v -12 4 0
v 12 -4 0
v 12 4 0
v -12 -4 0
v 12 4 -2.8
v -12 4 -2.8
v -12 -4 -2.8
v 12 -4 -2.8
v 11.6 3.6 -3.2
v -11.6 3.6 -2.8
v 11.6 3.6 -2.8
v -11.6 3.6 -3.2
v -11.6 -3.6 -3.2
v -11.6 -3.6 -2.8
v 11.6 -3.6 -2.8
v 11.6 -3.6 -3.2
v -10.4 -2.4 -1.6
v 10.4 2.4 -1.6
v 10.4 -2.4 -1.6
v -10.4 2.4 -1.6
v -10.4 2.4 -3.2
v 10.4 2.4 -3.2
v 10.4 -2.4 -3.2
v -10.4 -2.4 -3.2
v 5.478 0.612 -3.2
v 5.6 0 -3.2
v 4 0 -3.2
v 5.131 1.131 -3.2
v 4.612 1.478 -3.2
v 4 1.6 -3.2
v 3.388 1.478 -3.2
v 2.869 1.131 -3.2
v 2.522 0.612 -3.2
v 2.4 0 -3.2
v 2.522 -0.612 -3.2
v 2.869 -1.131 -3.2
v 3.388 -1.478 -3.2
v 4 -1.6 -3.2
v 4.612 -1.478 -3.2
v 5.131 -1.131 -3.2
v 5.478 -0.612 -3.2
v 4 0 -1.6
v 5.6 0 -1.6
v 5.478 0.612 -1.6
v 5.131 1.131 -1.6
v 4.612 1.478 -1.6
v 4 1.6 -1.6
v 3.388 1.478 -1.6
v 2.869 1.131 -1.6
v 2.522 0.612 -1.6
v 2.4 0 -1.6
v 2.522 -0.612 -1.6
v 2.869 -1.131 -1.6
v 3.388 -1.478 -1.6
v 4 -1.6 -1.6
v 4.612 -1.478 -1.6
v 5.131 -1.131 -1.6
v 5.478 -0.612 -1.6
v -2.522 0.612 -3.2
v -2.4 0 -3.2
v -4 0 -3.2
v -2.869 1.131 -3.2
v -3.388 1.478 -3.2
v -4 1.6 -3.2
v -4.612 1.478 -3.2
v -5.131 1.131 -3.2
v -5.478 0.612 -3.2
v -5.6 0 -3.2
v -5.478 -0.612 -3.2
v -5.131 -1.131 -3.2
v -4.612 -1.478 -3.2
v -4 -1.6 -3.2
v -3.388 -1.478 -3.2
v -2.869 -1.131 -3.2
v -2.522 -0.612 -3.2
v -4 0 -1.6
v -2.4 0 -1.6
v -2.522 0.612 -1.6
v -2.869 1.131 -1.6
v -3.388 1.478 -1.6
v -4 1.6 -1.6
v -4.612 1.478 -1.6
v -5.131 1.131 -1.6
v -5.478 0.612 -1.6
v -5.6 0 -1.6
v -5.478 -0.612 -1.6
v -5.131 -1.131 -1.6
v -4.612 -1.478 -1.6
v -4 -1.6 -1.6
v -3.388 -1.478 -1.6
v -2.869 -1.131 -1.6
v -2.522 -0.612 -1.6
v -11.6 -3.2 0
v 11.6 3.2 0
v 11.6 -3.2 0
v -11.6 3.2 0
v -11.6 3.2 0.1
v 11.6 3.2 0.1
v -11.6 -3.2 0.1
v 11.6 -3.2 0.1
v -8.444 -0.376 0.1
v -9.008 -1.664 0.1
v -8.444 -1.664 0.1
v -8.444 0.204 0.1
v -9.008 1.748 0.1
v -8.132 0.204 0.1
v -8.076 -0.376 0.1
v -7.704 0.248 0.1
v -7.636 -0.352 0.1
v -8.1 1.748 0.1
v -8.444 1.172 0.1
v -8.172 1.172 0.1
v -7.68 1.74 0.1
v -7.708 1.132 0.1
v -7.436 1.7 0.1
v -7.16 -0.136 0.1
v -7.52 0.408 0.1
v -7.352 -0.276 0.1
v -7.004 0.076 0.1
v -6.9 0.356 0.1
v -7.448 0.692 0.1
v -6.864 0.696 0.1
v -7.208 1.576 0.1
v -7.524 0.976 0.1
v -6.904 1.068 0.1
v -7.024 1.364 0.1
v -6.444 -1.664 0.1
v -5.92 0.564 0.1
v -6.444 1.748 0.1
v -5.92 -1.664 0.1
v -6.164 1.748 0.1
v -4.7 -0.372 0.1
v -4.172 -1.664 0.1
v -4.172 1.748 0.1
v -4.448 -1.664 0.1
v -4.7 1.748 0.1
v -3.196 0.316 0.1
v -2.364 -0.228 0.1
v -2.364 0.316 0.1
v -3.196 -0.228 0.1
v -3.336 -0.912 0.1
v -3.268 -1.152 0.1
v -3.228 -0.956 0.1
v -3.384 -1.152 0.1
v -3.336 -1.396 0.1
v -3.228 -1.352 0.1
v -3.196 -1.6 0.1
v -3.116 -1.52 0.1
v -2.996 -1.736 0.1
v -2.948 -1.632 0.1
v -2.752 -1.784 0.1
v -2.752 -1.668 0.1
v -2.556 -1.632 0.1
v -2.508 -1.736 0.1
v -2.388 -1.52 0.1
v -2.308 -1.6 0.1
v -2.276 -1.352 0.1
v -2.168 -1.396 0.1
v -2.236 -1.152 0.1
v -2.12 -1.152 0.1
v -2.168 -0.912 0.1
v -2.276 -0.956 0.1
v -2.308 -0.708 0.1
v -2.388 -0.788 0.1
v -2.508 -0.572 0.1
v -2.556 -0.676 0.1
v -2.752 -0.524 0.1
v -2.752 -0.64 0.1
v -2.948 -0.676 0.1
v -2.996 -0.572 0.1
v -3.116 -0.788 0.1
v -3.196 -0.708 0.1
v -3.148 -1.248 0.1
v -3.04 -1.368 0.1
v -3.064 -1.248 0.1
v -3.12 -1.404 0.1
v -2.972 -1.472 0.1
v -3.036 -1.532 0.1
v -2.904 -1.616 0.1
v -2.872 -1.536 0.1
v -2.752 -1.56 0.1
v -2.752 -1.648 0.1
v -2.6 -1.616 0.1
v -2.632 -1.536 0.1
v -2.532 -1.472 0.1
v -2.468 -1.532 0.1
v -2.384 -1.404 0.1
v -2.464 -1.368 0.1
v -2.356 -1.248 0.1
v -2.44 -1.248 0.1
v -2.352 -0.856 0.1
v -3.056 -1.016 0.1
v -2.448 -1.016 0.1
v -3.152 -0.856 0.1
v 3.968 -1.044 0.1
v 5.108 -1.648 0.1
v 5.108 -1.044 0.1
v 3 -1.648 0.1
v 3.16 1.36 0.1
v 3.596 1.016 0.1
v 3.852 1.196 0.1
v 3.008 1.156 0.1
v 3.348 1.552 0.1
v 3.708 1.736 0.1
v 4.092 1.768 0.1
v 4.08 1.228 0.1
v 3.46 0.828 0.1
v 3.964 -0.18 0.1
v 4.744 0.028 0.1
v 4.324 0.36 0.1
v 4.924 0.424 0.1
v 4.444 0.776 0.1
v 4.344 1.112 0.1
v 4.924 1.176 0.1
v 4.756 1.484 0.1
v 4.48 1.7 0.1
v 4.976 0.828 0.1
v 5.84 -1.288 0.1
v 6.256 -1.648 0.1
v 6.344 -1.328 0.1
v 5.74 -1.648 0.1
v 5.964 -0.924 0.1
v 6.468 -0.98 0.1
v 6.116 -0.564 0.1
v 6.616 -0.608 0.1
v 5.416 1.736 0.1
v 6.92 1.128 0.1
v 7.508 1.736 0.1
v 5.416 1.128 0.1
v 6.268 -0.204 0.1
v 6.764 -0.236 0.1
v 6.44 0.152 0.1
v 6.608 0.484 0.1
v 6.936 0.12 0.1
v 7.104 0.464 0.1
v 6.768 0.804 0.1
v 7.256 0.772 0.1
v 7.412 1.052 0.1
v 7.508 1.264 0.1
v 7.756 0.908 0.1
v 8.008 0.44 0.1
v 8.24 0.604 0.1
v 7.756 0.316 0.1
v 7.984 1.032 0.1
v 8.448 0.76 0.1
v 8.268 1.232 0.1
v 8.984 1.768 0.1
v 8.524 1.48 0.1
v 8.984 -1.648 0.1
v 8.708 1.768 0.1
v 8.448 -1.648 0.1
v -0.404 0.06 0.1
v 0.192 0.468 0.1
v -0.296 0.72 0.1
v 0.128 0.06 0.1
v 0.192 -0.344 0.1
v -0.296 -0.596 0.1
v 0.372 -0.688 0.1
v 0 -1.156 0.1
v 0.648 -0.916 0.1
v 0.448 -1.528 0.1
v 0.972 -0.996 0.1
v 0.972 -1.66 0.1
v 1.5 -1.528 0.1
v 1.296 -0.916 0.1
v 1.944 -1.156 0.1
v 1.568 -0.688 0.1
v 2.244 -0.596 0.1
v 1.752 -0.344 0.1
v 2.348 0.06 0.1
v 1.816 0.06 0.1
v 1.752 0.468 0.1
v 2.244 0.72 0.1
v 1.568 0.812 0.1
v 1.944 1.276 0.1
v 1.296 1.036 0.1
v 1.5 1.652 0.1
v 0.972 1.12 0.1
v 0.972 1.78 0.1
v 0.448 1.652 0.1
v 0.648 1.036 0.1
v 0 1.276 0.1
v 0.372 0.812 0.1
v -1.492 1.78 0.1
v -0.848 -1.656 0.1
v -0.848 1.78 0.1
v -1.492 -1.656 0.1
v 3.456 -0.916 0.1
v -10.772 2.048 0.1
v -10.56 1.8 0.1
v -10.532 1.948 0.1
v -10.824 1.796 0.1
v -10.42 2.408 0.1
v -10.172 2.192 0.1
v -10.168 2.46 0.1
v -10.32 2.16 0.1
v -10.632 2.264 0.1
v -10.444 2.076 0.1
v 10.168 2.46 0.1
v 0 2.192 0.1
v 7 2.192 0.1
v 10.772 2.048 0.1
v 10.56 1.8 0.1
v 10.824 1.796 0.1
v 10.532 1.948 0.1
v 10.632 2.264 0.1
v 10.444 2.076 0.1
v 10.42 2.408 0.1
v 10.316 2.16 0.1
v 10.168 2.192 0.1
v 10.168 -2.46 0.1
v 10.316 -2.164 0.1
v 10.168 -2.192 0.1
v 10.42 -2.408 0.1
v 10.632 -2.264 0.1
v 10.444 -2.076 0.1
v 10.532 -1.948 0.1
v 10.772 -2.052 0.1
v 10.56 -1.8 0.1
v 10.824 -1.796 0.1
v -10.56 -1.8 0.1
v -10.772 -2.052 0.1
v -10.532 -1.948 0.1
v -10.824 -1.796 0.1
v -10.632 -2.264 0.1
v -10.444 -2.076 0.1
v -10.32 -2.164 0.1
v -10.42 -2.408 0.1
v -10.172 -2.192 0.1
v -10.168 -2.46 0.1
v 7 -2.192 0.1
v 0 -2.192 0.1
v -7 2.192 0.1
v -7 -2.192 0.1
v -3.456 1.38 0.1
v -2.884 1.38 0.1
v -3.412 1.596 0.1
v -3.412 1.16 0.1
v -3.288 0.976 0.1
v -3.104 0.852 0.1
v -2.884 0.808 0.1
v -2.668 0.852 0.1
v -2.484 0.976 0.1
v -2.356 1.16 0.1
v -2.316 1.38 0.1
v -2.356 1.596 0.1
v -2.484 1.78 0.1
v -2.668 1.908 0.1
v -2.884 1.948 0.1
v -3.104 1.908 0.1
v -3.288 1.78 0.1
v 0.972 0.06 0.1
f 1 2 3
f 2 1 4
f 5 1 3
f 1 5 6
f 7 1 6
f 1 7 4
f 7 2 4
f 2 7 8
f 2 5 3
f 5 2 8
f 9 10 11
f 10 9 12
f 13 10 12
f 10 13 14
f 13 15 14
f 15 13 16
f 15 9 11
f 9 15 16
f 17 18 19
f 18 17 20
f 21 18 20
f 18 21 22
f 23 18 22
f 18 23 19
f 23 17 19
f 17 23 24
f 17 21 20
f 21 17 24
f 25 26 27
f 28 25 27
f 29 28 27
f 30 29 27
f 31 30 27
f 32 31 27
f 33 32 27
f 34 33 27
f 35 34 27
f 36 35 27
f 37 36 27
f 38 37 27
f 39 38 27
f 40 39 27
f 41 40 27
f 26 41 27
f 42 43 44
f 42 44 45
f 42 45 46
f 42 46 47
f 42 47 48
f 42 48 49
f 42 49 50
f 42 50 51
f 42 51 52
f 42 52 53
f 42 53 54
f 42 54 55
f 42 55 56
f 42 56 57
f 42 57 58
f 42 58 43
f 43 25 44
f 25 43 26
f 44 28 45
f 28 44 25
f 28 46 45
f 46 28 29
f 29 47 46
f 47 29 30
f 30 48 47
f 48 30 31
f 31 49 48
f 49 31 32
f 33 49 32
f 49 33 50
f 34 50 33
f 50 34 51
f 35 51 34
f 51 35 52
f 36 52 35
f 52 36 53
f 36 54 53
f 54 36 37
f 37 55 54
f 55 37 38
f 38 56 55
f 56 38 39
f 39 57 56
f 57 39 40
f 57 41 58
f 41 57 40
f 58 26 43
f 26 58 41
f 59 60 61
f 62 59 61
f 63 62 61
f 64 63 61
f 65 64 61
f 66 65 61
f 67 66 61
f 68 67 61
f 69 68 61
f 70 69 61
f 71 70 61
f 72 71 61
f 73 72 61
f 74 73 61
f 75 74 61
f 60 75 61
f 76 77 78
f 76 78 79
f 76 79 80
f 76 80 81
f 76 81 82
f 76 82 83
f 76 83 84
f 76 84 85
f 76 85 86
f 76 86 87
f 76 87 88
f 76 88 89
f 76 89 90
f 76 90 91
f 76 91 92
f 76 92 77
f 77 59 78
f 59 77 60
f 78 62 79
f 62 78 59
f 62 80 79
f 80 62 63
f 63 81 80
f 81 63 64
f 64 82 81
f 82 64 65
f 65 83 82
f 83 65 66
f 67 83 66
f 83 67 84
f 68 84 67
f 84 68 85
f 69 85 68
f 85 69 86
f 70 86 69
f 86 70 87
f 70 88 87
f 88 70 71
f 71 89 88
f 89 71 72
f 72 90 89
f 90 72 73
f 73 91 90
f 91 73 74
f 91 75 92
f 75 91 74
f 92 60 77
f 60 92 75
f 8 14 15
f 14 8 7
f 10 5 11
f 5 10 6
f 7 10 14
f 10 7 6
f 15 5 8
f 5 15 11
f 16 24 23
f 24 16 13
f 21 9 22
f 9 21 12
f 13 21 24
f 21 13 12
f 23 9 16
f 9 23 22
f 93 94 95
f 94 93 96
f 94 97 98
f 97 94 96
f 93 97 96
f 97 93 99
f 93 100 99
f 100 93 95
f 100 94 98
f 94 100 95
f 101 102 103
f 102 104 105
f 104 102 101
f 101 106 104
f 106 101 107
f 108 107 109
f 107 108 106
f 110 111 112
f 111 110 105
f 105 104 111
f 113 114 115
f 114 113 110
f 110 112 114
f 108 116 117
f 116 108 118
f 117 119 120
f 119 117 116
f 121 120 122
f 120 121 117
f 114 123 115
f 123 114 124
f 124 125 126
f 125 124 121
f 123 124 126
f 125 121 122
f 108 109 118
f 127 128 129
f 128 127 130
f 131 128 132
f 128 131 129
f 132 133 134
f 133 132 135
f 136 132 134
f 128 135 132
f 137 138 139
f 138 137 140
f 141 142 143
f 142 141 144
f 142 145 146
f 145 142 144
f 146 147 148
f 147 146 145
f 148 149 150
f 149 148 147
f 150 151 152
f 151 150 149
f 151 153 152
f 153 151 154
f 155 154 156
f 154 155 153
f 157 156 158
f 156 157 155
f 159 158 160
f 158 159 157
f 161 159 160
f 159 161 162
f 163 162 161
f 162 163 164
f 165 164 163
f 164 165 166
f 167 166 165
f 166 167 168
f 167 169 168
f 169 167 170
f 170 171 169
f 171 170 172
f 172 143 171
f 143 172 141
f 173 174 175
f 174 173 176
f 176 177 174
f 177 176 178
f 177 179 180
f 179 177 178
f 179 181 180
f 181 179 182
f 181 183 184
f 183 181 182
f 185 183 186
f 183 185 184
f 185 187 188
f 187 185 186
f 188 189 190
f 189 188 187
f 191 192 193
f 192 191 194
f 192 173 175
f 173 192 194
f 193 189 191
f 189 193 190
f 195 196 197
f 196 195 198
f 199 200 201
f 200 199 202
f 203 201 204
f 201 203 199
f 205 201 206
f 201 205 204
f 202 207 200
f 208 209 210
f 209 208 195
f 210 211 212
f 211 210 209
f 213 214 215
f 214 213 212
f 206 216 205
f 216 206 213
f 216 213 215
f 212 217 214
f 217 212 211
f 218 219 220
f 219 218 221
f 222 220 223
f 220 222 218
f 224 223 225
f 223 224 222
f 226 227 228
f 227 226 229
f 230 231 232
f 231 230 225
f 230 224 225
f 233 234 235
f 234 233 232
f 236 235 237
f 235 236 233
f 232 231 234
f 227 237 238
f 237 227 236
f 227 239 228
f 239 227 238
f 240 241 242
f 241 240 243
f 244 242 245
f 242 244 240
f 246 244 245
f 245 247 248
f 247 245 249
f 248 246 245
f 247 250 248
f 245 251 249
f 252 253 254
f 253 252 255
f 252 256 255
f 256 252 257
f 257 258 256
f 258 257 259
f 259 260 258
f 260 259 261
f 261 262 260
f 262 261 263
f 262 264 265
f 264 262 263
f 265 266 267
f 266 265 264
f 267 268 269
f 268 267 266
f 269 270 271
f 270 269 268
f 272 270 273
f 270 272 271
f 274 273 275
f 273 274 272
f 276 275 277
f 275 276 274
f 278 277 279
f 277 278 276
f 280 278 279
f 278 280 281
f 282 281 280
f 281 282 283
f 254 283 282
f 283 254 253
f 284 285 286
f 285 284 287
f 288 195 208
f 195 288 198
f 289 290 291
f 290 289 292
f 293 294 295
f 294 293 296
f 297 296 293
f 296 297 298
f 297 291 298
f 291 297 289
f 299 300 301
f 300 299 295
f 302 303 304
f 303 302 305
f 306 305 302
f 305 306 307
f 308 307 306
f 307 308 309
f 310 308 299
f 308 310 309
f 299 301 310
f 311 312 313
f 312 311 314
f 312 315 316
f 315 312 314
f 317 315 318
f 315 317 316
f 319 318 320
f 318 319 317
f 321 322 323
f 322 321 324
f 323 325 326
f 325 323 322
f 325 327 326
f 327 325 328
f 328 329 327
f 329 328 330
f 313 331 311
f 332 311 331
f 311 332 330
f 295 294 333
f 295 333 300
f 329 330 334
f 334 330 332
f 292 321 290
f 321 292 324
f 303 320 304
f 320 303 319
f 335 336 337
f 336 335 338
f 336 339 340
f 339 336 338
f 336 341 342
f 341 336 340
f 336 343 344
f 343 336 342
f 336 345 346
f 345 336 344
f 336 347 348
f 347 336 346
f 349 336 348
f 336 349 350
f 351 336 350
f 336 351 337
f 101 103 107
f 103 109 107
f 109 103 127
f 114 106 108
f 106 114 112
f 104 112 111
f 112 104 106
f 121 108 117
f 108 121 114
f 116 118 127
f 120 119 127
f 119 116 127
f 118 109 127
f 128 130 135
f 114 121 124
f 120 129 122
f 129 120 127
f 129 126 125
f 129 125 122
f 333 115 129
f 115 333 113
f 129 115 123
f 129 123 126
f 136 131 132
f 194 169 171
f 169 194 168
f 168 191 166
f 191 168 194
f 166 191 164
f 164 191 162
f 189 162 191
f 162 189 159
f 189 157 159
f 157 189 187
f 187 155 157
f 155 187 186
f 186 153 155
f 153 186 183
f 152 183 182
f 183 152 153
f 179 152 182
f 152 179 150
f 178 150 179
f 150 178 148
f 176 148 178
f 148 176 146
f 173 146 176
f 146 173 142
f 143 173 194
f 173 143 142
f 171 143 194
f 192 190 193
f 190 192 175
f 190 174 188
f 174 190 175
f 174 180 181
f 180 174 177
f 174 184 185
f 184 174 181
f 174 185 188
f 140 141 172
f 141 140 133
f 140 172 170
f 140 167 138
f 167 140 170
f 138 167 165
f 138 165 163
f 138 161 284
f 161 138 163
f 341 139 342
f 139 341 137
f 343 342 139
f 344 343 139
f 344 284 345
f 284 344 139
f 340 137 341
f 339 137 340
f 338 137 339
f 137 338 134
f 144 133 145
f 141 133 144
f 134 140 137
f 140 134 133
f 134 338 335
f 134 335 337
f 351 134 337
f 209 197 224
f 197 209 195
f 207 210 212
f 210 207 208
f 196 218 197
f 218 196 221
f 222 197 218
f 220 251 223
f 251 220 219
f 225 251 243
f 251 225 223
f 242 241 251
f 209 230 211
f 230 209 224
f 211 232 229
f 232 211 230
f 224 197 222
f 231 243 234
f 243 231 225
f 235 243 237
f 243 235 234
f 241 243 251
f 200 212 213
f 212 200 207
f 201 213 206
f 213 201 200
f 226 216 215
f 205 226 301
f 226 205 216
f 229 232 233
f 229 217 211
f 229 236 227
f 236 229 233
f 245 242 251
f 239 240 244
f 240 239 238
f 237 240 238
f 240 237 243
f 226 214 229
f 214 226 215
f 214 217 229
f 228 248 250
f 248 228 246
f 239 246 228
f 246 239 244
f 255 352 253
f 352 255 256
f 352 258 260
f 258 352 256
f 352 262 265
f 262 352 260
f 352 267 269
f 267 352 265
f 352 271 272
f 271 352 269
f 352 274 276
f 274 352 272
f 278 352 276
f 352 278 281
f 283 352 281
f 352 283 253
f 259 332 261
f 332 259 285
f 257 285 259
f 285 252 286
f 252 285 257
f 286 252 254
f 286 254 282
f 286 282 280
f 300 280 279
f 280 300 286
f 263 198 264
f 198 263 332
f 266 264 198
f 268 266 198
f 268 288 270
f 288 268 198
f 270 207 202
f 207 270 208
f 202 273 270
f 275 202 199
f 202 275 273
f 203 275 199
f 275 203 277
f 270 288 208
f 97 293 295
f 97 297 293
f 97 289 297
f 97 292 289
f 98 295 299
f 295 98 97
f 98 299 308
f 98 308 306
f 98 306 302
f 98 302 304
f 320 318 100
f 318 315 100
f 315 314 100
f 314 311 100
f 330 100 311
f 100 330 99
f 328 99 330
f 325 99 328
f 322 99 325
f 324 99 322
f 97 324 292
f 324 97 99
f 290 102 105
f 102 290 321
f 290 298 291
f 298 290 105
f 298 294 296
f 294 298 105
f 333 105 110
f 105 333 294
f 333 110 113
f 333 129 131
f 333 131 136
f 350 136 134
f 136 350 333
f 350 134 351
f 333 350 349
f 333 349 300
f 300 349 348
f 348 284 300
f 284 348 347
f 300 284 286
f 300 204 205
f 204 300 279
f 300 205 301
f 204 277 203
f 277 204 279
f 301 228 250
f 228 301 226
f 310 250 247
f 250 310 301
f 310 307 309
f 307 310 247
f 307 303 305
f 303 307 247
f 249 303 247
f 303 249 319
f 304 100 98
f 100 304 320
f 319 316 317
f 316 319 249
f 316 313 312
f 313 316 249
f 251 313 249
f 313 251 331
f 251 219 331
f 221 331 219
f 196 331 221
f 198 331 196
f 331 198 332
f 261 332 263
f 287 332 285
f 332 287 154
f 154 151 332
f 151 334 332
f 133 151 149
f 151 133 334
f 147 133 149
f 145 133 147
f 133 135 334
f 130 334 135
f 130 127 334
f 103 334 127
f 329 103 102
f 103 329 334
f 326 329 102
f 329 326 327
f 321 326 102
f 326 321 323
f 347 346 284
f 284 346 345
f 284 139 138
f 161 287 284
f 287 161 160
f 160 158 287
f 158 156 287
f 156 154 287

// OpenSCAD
use <../lib.scad>
use <6296256k.scad>
use <63864.scad>
function ldraw_lib__63864d0i() = [
// 0 Tile  1 x  3 with Black "PN IO 271" on White Background Sticker
// 0 Name: 63864d0i.dat
// 0 Author: Evert-Jan Boer [ejboer]
// 0 !LDRAW_ORG Shortcut UPDATE 2026-07
// 0 !LICENSE Licensed under CC BY 4.0 : see CAreadme.txt
// 
// 0 BFC CERTIFY CCW
  [0,"BFC","CERTIFY"],
  [0,"BFC","CCW"],
// 
// 0 !CATEGORY Sticker Shortcut
// 0 !KEYWORDS Bricklink 63864pb157, Fiat 500, set 10271
// 
// 0 !HISTORY 2026-07-30 [OrionP] Official Update 2026-07
// 
// 1 16 0 0 0 1 0 0 0 1 0 0 0 1 63864.dat
  [1,16,0,0,0,1,0,0,0,1,0,0,0,1, ldraw_lib__63864()],
// 1 16 0 0 0 1 0 0 0 1 0 0 0 1 6296256k.dat
  [1,16,0,0,0,1,0,0,0,1,0,0,0,1, ldraw_lib__6296256k()],
];
module ldraw_lib__63864d0i(step=0, col=false, unit=2/5, alt=false, line=0.2, solid=!$preview)
    makepoly(ldraw_lib__63864d0i(), step=step, col=col, unit=unit, alt=alt, line=line, solid=solid);
ldraw_lib__63864d0i(line=0.2);
